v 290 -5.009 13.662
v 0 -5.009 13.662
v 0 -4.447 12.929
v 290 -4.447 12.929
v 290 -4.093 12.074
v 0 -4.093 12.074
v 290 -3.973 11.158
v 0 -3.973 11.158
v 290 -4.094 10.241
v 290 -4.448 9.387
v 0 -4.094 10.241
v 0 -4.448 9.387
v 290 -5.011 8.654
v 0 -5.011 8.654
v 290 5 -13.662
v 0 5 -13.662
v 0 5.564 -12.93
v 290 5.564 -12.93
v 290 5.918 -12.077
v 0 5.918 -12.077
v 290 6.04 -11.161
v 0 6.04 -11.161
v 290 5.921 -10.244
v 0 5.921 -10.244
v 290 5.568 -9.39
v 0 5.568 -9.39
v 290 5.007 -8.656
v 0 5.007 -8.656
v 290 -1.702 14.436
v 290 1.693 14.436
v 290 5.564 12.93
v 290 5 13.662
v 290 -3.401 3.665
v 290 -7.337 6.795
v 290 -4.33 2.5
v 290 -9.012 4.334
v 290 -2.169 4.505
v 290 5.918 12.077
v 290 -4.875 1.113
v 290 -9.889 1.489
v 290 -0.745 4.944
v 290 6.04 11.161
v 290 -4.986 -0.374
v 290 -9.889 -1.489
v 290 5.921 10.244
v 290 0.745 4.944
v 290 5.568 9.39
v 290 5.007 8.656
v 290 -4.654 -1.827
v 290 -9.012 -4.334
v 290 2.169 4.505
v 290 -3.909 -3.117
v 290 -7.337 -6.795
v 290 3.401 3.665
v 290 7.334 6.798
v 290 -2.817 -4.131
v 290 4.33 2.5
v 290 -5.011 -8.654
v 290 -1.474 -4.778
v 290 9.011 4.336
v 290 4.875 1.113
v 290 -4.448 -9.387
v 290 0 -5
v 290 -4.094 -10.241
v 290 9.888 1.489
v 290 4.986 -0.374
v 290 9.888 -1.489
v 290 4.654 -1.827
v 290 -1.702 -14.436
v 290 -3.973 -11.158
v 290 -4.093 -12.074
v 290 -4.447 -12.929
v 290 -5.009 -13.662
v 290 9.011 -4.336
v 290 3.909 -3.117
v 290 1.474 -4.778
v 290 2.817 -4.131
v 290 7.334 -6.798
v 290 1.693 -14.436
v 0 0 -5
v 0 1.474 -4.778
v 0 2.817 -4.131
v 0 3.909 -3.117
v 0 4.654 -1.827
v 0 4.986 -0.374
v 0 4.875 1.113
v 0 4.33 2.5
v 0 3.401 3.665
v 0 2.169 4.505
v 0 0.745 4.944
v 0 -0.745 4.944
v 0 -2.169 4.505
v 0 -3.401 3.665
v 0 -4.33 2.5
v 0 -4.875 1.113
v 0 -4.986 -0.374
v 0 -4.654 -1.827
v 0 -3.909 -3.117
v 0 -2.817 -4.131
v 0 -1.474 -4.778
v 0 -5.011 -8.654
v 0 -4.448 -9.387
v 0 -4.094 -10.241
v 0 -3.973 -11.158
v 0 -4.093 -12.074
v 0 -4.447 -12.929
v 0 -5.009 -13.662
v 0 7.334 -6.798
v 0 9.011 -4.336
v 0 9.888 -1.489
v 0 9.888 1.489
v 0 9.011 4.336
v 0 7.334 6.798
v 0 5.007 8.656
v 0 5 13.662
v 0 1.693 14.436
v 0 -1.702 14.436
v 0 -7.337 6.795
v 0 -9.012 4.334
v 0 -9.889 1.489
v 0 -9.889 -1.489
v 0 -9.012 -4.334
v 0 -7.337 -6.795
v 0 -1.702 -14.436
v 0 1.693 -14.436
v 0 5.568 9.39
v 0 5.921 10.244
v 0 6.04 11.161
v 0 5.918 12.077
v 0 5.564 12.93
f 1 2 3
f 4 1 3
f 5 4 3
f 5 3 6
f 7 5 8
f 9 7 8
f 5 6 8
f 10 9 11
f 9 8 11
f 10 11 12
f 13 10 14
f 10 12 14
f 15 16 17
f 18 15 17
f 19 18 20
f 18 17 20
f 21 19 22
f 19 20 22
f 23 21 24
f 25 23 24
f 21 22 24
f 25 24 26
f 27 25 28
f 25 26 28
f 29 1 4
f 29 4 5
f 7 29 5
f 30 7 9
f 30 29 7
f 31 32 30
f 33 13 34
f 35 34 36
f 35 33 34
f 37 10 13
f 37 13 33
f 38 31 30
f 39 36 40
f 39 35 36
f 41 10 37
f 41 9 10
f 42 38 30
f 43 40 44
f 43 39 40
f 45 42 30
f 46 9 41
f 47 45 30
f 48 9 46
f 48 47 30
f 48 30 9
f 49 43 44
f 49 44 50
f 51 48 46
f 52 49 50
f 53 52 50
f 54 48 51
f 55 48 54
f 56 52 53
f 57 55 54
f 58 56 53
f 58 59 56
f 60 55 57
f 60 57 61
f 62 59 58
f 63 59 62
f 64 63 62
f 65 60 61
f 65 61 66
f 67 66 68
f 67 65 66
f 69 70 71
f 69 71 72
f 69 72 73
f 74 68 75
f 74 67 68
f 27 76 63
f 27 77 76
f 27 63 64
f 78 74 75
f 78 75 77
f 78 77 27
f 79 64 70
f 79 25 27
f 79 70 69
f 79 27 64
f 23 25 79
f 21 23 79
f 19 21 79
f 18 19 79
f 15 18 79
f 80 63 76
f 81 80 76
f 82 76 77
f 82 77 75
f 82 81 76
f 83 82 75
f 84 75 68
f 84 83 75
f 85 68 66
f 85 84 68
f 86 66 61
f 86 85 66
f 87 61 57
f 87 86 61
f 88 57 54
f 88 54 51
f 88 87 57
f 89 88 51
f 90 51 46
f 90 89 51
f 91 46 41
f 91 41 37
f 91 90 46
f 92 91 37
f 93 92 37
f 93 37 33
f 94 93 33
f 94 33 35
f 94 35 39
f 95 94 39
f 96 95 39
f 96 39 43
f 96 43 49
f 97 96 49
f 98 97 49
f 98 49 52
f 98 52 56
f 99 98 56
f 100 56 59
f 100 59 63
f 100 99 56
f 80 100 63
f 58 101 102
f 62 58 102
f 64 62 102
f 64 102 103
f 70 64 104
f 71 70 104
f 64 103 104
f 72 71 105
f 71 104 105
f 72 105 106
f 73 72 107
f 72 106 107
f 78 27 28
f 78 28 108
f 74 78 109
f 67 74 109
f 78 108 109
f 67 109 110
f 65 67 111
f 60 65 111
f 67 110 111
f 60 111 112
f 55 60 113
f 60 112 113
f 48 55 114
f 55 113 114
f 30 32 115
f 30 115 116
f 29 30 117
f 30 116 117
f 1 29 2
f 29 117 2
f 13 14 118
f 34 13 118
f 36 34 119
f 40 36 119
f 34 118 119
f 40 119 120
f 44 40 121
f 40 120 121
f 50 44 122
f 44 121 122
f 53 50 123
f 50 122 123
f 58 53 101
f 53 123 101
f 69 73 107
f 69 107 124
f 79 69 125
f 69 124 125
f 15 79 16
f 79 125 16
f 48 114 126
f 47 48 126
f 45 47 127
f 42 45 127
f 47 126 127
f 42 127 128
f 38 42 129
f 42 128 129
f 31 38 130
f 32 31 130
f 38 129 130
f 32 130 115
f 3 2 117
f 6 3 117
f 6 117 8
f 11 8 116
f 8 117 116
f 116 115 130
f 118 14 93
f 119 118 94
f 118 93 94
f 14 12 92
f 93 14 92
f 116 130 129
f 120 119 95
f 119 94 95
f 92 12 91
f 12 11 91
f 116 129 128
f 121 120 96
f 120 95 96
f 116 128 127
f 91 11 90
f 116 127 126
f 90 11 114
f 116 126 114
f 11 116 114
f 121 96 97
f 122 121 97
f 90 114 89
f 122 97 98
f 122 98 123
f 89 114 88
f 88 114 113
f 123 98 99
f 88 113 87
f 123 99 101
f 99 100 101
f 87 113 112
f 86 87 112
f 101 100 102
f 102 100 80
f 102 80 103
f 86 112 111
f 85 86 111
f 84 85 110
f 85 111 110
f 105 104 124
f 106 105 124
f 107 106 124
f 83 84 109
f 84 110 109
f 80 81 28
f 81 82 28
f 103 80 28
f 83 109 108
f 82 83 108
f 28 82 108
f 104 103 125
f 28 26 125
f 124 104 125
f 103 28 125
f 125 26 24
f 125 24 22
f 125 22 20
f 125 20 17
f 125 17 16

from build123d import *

# Parameters (mm, degrees)
SKETCH1_R           = 10
SKETCH1_R_2         = 5
BOSS_EXTRUDE1_DEPTH = 290


with BuildPart() as part:
    # Sketch1 → Boss-Extrude1 (new body)
    # profile 1 of 3: a face of its own
    with BuildSketch(Plane(origin=(0, 0, 0), x_dir=(0, 0, -1), z_dir=(1, 0, 0))):
        Circle(SKETCH1_R)
        Circle(SKETCH1_R_2, mode=Mode.SUBTRACT)
    # profile 2 of 3: a face of its own
    with BuildSketch(Plane(origin=(0, 0, 0), x_dir=(0, 0, -1), z_dir=(1, 0, 0))):
        with BuildLine():
            ThreePointArc((8.656235338, 5.006954141), (9.658218091, 2.59206931), (10, 0))
            ThreePointArc((10, 0), (9.657587422, -2.594418084), (8.653798961, -5.011163891))
            ThreePointArc((8.653798961, -5.011163891), (11.157678989, -3.972789688), (13.662430885, -5.009059016))
            ThreePointArc((13.662430885, -5.009059016), (14.533959389, -0.004529508), (13.662430885, 5))
            ThreePointArc((13.662430885, 5), (11.160773363, 6.040295531), (8.656235338, 5.006954141))
        make_face()
    # profile 3 of 3: a face of its own
    with BuildSketch(Plane(origin=(0, 0, 0), x_dir=(0, 0, -1), z_dir=(1, 0, 0))):
        with BuildLine():
            ThreePointArc((-8.653798961, -5.011163891), (-9.999999704, -0.002431971), (-8.656235338, 5.006954141))
            ThreePointArc((-8.656235338, 5.006954141), (-11.160773363, 6.040295531), (-13.662430885, 5))
            ThreePointArc((-13.662430885, 5), (-14.533959389, -0.004529508), (-13.662430885, -5.009059016))
            ThreePointArc((-13.662430885, -5.009059016), (-11.157678989, -3.972789688), (-8.653798961, -5.011163891))
        make_face()
    extrude(amount=BOSS_EXTRUDE1_DEPTH)


solid = part.part
